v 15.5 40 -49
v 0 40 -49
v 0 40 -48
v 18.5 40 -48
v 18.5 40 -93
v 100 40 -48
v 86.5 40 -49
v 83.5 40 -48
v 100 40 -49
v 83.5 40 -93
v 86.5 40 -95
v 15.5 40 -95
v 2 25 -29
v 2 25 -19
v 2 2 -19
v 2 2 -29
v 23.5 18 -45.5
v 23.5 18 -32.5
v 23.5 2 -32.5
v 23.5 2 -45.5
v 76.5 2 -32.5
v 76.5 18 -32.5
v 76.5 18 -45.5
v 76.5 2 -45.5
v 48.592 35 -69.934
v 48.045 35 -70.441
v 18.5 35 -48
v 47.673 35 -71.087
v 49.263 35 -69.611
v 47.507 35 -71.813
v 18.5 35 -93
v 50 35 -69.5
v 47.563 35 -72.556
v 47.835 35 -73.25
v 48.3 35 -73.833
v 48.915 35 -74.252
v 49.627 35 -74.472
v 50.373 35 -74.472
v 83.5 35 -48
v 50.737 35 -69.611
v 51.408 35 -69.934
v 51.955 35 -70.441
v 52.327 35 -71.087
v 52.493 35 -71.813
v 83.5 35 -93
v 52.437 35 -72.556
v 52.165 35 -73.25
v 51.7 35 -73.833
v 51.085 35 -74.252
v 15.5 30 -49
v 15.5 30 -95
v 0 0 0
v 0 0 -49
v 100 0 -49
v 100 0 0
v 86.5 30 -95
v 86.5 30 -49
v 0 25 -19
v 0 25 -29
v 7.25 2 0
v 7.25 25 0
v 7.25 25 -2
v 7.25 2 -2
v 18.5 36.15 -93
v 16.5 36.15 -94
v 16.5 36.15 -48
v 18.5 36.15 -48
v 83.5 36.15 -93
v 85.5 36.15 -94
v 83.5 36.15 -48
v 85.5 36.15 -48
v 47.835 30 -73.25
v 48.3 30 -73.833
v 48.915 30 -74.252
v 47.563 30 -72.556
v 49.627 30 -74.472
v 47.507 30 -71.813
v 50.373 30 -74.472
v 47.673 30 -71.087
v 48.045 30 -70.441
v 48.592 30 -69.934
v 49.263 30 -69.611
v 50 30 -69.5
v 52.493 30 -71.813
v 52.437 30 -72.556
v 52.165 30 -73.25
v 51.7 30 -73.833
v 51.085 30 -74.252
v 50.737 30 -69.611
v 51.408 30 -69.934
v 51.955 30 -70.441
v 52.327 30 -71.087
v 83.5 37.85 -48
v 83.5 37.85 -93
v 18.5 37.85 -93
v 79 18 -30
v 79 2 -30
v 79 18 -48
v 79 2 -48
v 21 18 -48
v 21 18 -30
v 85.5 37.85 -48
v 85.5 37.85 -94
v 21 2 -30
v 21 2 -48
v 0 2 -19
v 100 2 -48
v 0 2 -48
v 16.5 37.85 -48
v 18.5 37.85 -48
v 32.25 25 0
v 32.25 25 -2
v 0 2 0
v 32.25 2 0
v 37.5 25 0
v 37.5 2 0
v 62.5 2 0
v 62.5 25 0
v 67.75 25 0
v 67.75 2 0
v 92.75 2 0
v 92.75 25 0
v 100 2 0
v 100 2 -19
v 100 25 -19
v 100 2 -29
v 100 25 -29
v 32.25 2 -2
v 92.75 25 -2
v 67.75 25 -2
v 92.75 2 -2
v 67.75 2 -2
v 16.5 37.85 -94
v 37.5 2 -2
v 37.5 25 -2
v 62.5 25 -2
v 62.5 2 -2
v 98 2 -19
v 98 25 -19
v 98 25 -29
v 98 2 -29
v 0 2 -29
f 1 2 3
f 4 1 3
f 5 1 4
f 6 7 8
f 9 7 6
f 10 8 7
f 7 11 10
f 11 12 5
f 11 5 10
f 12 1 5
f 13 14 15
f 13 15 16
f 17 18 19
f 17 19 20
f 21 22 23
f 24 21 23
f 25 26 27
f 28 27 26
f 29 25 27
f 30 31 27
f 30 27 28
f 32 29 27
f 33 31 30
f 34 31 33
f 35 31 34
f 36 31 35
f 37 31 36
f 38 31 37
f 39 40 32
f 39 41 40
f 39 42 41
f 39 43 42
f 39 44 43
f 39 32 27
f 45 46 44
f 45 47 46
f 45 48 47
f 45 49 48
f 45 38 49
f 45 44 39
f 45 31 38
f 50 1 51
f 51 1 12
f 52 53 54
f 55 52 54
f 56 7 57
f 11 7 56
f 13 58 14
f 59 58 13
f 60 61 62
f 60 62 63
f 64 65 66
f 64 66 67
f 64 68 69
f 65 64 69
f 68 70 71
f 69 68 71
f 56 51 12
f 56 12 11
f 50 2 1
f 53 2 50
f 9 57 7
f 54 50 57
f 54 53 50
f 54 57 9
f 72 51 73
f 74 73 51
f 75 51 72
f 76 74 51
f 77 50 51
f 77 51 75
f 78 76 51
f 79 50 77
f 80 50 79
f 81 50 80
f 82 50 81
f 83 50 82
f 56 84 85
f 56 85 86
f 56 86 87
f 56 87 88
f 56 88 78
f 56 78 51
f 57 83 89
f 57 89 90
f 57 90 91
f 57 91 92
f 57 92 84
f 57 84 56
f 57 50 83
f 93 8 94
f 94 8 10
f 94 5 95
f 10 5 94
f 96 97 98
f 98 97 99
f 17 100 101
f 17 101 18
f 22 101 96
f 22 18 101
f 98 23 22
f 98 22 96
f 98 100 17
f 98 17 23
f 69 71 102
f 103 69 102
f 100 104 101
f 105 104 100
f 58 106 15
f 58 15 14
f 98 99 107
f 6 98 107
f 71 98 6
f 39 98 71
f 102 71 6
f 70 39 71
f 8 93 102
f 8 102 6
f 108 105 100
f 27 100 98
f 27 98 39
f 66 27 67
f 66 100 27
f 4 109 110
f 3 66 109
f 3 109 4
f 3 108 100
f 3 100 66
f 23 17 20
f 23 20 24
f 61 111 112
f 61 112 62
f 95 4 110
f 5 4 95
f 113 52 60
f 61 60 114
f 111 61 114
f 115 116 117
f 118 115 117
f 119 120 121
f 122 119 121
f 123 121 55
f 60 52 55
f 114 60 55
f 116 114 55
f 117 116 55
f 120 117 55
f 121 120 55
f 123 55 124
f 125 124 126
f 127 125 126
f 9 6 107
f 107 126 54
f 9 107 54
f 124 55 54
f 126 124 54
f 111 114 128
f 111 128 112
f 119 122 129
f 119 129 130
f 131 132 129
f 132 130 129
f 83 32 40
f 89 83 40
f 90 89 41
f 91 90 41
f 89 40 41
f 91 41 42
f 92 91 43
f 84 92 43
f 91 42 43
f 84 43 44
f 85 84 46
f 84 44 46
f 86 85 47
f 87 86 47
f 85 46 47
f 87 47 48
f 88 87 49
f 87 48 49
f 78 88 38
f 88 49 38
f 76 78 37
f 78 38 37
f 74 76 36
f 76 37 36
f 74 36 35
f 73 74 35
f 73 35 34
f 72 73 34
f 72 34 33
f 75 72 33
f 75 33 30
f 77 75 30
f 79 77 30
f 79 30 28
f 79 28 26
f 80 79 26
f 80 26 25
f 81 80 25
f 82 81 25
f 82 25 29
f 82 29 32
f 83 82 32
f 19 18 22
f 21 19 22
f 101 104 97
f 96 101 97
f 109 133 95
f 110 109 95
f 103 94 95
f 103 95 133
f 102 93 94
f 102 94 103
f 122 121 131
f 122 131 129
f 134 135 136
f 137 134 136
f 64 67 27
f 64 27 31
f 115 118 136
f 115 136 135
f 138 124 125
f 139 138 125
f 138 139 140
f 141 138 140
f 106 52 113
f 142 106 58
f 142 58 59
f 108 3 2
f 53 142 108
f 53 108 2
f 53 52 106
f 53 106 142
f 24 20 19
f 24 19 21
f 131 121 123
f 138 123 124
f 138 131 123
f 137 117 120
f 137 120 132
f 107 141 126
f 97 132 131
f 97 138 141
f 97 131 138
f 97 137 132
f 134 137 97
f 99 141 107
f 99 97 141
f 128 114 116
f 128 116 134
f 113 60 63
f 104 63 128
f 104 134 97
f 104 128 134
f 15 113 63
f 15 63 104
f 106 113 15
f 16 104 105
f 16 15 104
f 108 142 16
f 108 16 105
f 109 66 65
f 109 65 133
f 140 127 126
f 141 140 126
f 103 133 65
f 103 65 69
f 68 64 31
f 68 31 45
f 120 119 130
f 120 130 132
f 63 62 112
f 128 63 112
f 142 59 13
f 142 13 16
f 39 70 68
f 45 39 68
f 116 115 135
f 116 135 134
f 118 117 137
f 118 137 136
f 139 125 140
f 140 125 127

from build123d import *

# Parameters (mm, degrees)
CROQUIS1_W              = 100
CROQUIS1_H              = 95
SALIENTE_EXTRUIR1_DEPTH = 40
CROQUIS3_W              = 20
CROQUIS3_H              = 46
CORTAR_EXTRUIR1_DEPTH   = 30
CROQUIS4_W              = 96
CROQUIS4_H              = 46
CORTAR_EXTRUIR2_DEPTH   = 38
CROQUIS5_W              = 65
CROQUIS5_H              = 67
CORTAR_EXTRUIR3_DEPTH   = 5
CROQUIS7_W              = 69
CROQUIS7_H              = 1.7
CORTAR_EXTRUIR4_DEPTH   = 46
CROQUIS9_W              = 5
CROQUIS9_H              = 15
CORTAR_EXTRUIR6_DEPTH   = 10
CROQUIS10_R             = 2.5
CORTAR_EXTRUIR8_DEPTH   = 143.302494708
CROQUIS11_W             = 46
CROQUIS11_H             = 30
CORTAR_EXTRUIR9_DEPTH   = 131.479883507
CROQUIS12_W             = 13.5
CROQUIS12_H             = 46
CROQUIS12_W_2           = 15.5
CORTAR_EXTRUIR10_DEPTH  = 144.614066163
CORTAR_EXTRUIR13_DEPTH  = 2
CORTAR_EXTRUIR14_DEPTH  = 2
CORTAR_EXTRUIR15_DEPTH  = 2
CROQUIS16_W             = 58
CROQUIS16_H             = 18
SALIENTE_EXTRUIR2_DEPTH = 16
CROQUIS17_W             = 53
CROQUIS17_H             = 13
CORTAR_EXTRUIR16_DEPTH  = 16


with BuildPart() as part:
    # Croquis1 → Saliente-Extruir1 (new body)
    with BuildSketch(Plane(origin=(0, 0, 0), x_dir=(1, 0, 0), z_dir=(0, 1, 0))):
        with Locations((50, 47.5)):
            Rectangle(CROQUIS1_W, CROQUIS1_H)
    extrude(amount=SALIENTE_EXTRUIR1_DEPTH)

    # Croquis3 → Cortar-Extruir1 (cut)
    with BuildSketch(Plane.XZ):
        with Locations((90, -72)):
            Rectangle(CROQUIS3_W, CROQUIS3_H)
        with Locations((10, -72)):
            Rectangle(CROQUIS3_W, CROQUIS3_H)
    extrude(amount=-CORTAR_EXTRUIR1_DEPTH, mode=Mode.SUBTRACT)

    # Croquis4 → Cortar-Extruir2 (cut)
    with BuildSketch(Plane(origin=(0, 40, 0), x_dir=(1, 0, 0), z_dir=(0, 1, 0))):
        with Locations((50, 25)):
            Rectangle(CROQUIS4_W, CROQUIS4_H)
    extrude(amount=-CORTAR_EXTRUIR2_DEPTH, mode=Mode.SUBTRACT)

    # Croquis5 → Cortar-Extruir3 (cut)
    with BuildSketch(Plane(origin=(0, 40, 0), x_dir=(1, 0, 0), z_dir=(0, 1, 0))):
        with Locations((51, 59.5)):
            Rectangle(CROQUIS5_W, CROQUIS5_H)
    extrude(amount=-CORTAR_EXTRUIR3_DEPTH, mode=Mode.SUBTRACT)

    # Croquis7 → Cortar-Extruir4 (cut)
    with BuildSketch(Plane.XY.offset(-48)):
        with Locations((51, 37)):
            Rectangle(CROQUIS7_W, CROQUIS7_H)
    extrude(amount=-CORTAR_EXTRUIR4_DEPTH, mode=Mode.SUBTRACT)

    # Croquis9 → Cortar-Extruir6 (cut)
    with BuildSketch(Plane(origin=(0, 40, 0), x_dir=(1, 0, 0), z_dir=(0, 1, 0))):
        with Locations((8.5, 77.5)):
            Rectangle(CROQUIS9_W, CROQUIS9_H)
        with Locations((91.5, 77.5)):
            Rectangle(CROQUIS9_W, CROQUIS9_H)
    extrude(amount=-CORTAR_EXTRUIR6_DEPTH, mode=Mode.SUBTRACT)

    # Croquis10 → Cortar-Extruir8 (cut, through all)
    with BuildSketch(Plane(origin=(0, 35, 0), x_dir=(1, 0, 0), z_dir=(0, 1, 0))):
        with Locations(Location((50, 72, 0), (0, 0, 270))):
            Circle(CROQUIS10_R)
    extrude(amount=-CORTAR_EXTRUIR8_DEPTH, mode=Mode.SUBTRACT)

    # Croquis11 → Cortar-Extruir9 (cut, through all)
    with BuildSketch(Plane(origin=(80, 0, 0), x_dir=(0, 0, -1), z_dir=(1, 0, 0))):
        with Locations((72, 15)):
            Rectangle(CROQUIS11_W, CROQUIS11_H)
    extrude(amount=-CORTAR_EXTRUIR9_DEPTH, mode=Mode.SUBTRACT)

    # Croquis12 → Cortar-Extruir10 (cut, through all)
    with BuildSketch(Plane(origin=(0, 40, 0), x_dir=(1, 0, 0), z_dir=(0, 1, 0))):
        with Locations((93.25, 72)):
            Rectangle(CROQUIS12_W, CROQUIS12_H)
        with Locations((7.75, 72)):
            Rectangle(CROQUIS12_W_2, CROQUIS12_H)
    extrude(amount=-CORTAR_EXTRUIR10_DEPTH, mode=Mode.SUBTRACT)

    # Croquis14 → Cortar-Extruir13 (cut)
    with BuildSketch(Plane(origin=(100, 0, 0), x_dir=(0, 0, -1), z_dir=(1, 0, 0))):
        Polygon((19, 25), (29, 25), (29, 2), (48, 2), (48, 40), (0, 40), (0, 2), (19, 2), align=None)
    extrude(amount=-CORTAR_EXTRUIR13_DEPTH, mode=Mode.SUBTRACT)

    # Croquis15 → Cortar-Extruir14 (cut)
    with BuildSketch(Plane.ZY):
        Polygon((-48, 2), (-48, 40), (0, 40), (0, 2), (-19, 2), (-19, 25), (-29, 25), (-29, 2), align=None)
    extrude(amount=-CORTAR_EXTRUIR14_DEPTH, mode=Mode.SUBTRACT)

    # Croquis13 → Cortar-Extruir15 (cut)
    with BuildSketch(Plane.XY):
        Polygon((2, 40), (98, 40), (98, 2), (92.75, 2), (92.75, 25), (67.75, 25), (67.75, 2), (62.5, 2), (62.5, 25), (37.5, 25), (37.5, 2), (32.25, 2), (32.25, 25), (7.25, 25), (7.25, 2), (2, 2), align=None)
    extrude(amount=-CORTAR_EXTRUIR15_DEPTH, mode=Mode.SUBTRACT)

    # Croquis16 → Saliente-Extruir2 (add)
    with BuildSketch(Plane(origin=(0, 2, 0), x_dir=(1, 0, 0), z_dir=(0, 1, 0))):
        with Locations((50, 39)):
            Rectangle(CROQUIS16_W, CROQUIS16_H)
    extrude(amount=SALIENTE_EXTRUIR2_DEPTH)

    # Croquis17 → Cortar-Extruir16 (cut)
    with BuildSketch(Plane(origin=(0, 18, 0), x_dir=(1, 0, 0), z_dir=(0, 1, 0))):
        with Locations((50, 39)):
            Rectangle(CROQUIS17_W, CROQUIS17_H)
    extrude(amount=-CORTAR_EXTRUIR16_DEPTH, mode=Mode.SUBTRACT)


solid = part.part
